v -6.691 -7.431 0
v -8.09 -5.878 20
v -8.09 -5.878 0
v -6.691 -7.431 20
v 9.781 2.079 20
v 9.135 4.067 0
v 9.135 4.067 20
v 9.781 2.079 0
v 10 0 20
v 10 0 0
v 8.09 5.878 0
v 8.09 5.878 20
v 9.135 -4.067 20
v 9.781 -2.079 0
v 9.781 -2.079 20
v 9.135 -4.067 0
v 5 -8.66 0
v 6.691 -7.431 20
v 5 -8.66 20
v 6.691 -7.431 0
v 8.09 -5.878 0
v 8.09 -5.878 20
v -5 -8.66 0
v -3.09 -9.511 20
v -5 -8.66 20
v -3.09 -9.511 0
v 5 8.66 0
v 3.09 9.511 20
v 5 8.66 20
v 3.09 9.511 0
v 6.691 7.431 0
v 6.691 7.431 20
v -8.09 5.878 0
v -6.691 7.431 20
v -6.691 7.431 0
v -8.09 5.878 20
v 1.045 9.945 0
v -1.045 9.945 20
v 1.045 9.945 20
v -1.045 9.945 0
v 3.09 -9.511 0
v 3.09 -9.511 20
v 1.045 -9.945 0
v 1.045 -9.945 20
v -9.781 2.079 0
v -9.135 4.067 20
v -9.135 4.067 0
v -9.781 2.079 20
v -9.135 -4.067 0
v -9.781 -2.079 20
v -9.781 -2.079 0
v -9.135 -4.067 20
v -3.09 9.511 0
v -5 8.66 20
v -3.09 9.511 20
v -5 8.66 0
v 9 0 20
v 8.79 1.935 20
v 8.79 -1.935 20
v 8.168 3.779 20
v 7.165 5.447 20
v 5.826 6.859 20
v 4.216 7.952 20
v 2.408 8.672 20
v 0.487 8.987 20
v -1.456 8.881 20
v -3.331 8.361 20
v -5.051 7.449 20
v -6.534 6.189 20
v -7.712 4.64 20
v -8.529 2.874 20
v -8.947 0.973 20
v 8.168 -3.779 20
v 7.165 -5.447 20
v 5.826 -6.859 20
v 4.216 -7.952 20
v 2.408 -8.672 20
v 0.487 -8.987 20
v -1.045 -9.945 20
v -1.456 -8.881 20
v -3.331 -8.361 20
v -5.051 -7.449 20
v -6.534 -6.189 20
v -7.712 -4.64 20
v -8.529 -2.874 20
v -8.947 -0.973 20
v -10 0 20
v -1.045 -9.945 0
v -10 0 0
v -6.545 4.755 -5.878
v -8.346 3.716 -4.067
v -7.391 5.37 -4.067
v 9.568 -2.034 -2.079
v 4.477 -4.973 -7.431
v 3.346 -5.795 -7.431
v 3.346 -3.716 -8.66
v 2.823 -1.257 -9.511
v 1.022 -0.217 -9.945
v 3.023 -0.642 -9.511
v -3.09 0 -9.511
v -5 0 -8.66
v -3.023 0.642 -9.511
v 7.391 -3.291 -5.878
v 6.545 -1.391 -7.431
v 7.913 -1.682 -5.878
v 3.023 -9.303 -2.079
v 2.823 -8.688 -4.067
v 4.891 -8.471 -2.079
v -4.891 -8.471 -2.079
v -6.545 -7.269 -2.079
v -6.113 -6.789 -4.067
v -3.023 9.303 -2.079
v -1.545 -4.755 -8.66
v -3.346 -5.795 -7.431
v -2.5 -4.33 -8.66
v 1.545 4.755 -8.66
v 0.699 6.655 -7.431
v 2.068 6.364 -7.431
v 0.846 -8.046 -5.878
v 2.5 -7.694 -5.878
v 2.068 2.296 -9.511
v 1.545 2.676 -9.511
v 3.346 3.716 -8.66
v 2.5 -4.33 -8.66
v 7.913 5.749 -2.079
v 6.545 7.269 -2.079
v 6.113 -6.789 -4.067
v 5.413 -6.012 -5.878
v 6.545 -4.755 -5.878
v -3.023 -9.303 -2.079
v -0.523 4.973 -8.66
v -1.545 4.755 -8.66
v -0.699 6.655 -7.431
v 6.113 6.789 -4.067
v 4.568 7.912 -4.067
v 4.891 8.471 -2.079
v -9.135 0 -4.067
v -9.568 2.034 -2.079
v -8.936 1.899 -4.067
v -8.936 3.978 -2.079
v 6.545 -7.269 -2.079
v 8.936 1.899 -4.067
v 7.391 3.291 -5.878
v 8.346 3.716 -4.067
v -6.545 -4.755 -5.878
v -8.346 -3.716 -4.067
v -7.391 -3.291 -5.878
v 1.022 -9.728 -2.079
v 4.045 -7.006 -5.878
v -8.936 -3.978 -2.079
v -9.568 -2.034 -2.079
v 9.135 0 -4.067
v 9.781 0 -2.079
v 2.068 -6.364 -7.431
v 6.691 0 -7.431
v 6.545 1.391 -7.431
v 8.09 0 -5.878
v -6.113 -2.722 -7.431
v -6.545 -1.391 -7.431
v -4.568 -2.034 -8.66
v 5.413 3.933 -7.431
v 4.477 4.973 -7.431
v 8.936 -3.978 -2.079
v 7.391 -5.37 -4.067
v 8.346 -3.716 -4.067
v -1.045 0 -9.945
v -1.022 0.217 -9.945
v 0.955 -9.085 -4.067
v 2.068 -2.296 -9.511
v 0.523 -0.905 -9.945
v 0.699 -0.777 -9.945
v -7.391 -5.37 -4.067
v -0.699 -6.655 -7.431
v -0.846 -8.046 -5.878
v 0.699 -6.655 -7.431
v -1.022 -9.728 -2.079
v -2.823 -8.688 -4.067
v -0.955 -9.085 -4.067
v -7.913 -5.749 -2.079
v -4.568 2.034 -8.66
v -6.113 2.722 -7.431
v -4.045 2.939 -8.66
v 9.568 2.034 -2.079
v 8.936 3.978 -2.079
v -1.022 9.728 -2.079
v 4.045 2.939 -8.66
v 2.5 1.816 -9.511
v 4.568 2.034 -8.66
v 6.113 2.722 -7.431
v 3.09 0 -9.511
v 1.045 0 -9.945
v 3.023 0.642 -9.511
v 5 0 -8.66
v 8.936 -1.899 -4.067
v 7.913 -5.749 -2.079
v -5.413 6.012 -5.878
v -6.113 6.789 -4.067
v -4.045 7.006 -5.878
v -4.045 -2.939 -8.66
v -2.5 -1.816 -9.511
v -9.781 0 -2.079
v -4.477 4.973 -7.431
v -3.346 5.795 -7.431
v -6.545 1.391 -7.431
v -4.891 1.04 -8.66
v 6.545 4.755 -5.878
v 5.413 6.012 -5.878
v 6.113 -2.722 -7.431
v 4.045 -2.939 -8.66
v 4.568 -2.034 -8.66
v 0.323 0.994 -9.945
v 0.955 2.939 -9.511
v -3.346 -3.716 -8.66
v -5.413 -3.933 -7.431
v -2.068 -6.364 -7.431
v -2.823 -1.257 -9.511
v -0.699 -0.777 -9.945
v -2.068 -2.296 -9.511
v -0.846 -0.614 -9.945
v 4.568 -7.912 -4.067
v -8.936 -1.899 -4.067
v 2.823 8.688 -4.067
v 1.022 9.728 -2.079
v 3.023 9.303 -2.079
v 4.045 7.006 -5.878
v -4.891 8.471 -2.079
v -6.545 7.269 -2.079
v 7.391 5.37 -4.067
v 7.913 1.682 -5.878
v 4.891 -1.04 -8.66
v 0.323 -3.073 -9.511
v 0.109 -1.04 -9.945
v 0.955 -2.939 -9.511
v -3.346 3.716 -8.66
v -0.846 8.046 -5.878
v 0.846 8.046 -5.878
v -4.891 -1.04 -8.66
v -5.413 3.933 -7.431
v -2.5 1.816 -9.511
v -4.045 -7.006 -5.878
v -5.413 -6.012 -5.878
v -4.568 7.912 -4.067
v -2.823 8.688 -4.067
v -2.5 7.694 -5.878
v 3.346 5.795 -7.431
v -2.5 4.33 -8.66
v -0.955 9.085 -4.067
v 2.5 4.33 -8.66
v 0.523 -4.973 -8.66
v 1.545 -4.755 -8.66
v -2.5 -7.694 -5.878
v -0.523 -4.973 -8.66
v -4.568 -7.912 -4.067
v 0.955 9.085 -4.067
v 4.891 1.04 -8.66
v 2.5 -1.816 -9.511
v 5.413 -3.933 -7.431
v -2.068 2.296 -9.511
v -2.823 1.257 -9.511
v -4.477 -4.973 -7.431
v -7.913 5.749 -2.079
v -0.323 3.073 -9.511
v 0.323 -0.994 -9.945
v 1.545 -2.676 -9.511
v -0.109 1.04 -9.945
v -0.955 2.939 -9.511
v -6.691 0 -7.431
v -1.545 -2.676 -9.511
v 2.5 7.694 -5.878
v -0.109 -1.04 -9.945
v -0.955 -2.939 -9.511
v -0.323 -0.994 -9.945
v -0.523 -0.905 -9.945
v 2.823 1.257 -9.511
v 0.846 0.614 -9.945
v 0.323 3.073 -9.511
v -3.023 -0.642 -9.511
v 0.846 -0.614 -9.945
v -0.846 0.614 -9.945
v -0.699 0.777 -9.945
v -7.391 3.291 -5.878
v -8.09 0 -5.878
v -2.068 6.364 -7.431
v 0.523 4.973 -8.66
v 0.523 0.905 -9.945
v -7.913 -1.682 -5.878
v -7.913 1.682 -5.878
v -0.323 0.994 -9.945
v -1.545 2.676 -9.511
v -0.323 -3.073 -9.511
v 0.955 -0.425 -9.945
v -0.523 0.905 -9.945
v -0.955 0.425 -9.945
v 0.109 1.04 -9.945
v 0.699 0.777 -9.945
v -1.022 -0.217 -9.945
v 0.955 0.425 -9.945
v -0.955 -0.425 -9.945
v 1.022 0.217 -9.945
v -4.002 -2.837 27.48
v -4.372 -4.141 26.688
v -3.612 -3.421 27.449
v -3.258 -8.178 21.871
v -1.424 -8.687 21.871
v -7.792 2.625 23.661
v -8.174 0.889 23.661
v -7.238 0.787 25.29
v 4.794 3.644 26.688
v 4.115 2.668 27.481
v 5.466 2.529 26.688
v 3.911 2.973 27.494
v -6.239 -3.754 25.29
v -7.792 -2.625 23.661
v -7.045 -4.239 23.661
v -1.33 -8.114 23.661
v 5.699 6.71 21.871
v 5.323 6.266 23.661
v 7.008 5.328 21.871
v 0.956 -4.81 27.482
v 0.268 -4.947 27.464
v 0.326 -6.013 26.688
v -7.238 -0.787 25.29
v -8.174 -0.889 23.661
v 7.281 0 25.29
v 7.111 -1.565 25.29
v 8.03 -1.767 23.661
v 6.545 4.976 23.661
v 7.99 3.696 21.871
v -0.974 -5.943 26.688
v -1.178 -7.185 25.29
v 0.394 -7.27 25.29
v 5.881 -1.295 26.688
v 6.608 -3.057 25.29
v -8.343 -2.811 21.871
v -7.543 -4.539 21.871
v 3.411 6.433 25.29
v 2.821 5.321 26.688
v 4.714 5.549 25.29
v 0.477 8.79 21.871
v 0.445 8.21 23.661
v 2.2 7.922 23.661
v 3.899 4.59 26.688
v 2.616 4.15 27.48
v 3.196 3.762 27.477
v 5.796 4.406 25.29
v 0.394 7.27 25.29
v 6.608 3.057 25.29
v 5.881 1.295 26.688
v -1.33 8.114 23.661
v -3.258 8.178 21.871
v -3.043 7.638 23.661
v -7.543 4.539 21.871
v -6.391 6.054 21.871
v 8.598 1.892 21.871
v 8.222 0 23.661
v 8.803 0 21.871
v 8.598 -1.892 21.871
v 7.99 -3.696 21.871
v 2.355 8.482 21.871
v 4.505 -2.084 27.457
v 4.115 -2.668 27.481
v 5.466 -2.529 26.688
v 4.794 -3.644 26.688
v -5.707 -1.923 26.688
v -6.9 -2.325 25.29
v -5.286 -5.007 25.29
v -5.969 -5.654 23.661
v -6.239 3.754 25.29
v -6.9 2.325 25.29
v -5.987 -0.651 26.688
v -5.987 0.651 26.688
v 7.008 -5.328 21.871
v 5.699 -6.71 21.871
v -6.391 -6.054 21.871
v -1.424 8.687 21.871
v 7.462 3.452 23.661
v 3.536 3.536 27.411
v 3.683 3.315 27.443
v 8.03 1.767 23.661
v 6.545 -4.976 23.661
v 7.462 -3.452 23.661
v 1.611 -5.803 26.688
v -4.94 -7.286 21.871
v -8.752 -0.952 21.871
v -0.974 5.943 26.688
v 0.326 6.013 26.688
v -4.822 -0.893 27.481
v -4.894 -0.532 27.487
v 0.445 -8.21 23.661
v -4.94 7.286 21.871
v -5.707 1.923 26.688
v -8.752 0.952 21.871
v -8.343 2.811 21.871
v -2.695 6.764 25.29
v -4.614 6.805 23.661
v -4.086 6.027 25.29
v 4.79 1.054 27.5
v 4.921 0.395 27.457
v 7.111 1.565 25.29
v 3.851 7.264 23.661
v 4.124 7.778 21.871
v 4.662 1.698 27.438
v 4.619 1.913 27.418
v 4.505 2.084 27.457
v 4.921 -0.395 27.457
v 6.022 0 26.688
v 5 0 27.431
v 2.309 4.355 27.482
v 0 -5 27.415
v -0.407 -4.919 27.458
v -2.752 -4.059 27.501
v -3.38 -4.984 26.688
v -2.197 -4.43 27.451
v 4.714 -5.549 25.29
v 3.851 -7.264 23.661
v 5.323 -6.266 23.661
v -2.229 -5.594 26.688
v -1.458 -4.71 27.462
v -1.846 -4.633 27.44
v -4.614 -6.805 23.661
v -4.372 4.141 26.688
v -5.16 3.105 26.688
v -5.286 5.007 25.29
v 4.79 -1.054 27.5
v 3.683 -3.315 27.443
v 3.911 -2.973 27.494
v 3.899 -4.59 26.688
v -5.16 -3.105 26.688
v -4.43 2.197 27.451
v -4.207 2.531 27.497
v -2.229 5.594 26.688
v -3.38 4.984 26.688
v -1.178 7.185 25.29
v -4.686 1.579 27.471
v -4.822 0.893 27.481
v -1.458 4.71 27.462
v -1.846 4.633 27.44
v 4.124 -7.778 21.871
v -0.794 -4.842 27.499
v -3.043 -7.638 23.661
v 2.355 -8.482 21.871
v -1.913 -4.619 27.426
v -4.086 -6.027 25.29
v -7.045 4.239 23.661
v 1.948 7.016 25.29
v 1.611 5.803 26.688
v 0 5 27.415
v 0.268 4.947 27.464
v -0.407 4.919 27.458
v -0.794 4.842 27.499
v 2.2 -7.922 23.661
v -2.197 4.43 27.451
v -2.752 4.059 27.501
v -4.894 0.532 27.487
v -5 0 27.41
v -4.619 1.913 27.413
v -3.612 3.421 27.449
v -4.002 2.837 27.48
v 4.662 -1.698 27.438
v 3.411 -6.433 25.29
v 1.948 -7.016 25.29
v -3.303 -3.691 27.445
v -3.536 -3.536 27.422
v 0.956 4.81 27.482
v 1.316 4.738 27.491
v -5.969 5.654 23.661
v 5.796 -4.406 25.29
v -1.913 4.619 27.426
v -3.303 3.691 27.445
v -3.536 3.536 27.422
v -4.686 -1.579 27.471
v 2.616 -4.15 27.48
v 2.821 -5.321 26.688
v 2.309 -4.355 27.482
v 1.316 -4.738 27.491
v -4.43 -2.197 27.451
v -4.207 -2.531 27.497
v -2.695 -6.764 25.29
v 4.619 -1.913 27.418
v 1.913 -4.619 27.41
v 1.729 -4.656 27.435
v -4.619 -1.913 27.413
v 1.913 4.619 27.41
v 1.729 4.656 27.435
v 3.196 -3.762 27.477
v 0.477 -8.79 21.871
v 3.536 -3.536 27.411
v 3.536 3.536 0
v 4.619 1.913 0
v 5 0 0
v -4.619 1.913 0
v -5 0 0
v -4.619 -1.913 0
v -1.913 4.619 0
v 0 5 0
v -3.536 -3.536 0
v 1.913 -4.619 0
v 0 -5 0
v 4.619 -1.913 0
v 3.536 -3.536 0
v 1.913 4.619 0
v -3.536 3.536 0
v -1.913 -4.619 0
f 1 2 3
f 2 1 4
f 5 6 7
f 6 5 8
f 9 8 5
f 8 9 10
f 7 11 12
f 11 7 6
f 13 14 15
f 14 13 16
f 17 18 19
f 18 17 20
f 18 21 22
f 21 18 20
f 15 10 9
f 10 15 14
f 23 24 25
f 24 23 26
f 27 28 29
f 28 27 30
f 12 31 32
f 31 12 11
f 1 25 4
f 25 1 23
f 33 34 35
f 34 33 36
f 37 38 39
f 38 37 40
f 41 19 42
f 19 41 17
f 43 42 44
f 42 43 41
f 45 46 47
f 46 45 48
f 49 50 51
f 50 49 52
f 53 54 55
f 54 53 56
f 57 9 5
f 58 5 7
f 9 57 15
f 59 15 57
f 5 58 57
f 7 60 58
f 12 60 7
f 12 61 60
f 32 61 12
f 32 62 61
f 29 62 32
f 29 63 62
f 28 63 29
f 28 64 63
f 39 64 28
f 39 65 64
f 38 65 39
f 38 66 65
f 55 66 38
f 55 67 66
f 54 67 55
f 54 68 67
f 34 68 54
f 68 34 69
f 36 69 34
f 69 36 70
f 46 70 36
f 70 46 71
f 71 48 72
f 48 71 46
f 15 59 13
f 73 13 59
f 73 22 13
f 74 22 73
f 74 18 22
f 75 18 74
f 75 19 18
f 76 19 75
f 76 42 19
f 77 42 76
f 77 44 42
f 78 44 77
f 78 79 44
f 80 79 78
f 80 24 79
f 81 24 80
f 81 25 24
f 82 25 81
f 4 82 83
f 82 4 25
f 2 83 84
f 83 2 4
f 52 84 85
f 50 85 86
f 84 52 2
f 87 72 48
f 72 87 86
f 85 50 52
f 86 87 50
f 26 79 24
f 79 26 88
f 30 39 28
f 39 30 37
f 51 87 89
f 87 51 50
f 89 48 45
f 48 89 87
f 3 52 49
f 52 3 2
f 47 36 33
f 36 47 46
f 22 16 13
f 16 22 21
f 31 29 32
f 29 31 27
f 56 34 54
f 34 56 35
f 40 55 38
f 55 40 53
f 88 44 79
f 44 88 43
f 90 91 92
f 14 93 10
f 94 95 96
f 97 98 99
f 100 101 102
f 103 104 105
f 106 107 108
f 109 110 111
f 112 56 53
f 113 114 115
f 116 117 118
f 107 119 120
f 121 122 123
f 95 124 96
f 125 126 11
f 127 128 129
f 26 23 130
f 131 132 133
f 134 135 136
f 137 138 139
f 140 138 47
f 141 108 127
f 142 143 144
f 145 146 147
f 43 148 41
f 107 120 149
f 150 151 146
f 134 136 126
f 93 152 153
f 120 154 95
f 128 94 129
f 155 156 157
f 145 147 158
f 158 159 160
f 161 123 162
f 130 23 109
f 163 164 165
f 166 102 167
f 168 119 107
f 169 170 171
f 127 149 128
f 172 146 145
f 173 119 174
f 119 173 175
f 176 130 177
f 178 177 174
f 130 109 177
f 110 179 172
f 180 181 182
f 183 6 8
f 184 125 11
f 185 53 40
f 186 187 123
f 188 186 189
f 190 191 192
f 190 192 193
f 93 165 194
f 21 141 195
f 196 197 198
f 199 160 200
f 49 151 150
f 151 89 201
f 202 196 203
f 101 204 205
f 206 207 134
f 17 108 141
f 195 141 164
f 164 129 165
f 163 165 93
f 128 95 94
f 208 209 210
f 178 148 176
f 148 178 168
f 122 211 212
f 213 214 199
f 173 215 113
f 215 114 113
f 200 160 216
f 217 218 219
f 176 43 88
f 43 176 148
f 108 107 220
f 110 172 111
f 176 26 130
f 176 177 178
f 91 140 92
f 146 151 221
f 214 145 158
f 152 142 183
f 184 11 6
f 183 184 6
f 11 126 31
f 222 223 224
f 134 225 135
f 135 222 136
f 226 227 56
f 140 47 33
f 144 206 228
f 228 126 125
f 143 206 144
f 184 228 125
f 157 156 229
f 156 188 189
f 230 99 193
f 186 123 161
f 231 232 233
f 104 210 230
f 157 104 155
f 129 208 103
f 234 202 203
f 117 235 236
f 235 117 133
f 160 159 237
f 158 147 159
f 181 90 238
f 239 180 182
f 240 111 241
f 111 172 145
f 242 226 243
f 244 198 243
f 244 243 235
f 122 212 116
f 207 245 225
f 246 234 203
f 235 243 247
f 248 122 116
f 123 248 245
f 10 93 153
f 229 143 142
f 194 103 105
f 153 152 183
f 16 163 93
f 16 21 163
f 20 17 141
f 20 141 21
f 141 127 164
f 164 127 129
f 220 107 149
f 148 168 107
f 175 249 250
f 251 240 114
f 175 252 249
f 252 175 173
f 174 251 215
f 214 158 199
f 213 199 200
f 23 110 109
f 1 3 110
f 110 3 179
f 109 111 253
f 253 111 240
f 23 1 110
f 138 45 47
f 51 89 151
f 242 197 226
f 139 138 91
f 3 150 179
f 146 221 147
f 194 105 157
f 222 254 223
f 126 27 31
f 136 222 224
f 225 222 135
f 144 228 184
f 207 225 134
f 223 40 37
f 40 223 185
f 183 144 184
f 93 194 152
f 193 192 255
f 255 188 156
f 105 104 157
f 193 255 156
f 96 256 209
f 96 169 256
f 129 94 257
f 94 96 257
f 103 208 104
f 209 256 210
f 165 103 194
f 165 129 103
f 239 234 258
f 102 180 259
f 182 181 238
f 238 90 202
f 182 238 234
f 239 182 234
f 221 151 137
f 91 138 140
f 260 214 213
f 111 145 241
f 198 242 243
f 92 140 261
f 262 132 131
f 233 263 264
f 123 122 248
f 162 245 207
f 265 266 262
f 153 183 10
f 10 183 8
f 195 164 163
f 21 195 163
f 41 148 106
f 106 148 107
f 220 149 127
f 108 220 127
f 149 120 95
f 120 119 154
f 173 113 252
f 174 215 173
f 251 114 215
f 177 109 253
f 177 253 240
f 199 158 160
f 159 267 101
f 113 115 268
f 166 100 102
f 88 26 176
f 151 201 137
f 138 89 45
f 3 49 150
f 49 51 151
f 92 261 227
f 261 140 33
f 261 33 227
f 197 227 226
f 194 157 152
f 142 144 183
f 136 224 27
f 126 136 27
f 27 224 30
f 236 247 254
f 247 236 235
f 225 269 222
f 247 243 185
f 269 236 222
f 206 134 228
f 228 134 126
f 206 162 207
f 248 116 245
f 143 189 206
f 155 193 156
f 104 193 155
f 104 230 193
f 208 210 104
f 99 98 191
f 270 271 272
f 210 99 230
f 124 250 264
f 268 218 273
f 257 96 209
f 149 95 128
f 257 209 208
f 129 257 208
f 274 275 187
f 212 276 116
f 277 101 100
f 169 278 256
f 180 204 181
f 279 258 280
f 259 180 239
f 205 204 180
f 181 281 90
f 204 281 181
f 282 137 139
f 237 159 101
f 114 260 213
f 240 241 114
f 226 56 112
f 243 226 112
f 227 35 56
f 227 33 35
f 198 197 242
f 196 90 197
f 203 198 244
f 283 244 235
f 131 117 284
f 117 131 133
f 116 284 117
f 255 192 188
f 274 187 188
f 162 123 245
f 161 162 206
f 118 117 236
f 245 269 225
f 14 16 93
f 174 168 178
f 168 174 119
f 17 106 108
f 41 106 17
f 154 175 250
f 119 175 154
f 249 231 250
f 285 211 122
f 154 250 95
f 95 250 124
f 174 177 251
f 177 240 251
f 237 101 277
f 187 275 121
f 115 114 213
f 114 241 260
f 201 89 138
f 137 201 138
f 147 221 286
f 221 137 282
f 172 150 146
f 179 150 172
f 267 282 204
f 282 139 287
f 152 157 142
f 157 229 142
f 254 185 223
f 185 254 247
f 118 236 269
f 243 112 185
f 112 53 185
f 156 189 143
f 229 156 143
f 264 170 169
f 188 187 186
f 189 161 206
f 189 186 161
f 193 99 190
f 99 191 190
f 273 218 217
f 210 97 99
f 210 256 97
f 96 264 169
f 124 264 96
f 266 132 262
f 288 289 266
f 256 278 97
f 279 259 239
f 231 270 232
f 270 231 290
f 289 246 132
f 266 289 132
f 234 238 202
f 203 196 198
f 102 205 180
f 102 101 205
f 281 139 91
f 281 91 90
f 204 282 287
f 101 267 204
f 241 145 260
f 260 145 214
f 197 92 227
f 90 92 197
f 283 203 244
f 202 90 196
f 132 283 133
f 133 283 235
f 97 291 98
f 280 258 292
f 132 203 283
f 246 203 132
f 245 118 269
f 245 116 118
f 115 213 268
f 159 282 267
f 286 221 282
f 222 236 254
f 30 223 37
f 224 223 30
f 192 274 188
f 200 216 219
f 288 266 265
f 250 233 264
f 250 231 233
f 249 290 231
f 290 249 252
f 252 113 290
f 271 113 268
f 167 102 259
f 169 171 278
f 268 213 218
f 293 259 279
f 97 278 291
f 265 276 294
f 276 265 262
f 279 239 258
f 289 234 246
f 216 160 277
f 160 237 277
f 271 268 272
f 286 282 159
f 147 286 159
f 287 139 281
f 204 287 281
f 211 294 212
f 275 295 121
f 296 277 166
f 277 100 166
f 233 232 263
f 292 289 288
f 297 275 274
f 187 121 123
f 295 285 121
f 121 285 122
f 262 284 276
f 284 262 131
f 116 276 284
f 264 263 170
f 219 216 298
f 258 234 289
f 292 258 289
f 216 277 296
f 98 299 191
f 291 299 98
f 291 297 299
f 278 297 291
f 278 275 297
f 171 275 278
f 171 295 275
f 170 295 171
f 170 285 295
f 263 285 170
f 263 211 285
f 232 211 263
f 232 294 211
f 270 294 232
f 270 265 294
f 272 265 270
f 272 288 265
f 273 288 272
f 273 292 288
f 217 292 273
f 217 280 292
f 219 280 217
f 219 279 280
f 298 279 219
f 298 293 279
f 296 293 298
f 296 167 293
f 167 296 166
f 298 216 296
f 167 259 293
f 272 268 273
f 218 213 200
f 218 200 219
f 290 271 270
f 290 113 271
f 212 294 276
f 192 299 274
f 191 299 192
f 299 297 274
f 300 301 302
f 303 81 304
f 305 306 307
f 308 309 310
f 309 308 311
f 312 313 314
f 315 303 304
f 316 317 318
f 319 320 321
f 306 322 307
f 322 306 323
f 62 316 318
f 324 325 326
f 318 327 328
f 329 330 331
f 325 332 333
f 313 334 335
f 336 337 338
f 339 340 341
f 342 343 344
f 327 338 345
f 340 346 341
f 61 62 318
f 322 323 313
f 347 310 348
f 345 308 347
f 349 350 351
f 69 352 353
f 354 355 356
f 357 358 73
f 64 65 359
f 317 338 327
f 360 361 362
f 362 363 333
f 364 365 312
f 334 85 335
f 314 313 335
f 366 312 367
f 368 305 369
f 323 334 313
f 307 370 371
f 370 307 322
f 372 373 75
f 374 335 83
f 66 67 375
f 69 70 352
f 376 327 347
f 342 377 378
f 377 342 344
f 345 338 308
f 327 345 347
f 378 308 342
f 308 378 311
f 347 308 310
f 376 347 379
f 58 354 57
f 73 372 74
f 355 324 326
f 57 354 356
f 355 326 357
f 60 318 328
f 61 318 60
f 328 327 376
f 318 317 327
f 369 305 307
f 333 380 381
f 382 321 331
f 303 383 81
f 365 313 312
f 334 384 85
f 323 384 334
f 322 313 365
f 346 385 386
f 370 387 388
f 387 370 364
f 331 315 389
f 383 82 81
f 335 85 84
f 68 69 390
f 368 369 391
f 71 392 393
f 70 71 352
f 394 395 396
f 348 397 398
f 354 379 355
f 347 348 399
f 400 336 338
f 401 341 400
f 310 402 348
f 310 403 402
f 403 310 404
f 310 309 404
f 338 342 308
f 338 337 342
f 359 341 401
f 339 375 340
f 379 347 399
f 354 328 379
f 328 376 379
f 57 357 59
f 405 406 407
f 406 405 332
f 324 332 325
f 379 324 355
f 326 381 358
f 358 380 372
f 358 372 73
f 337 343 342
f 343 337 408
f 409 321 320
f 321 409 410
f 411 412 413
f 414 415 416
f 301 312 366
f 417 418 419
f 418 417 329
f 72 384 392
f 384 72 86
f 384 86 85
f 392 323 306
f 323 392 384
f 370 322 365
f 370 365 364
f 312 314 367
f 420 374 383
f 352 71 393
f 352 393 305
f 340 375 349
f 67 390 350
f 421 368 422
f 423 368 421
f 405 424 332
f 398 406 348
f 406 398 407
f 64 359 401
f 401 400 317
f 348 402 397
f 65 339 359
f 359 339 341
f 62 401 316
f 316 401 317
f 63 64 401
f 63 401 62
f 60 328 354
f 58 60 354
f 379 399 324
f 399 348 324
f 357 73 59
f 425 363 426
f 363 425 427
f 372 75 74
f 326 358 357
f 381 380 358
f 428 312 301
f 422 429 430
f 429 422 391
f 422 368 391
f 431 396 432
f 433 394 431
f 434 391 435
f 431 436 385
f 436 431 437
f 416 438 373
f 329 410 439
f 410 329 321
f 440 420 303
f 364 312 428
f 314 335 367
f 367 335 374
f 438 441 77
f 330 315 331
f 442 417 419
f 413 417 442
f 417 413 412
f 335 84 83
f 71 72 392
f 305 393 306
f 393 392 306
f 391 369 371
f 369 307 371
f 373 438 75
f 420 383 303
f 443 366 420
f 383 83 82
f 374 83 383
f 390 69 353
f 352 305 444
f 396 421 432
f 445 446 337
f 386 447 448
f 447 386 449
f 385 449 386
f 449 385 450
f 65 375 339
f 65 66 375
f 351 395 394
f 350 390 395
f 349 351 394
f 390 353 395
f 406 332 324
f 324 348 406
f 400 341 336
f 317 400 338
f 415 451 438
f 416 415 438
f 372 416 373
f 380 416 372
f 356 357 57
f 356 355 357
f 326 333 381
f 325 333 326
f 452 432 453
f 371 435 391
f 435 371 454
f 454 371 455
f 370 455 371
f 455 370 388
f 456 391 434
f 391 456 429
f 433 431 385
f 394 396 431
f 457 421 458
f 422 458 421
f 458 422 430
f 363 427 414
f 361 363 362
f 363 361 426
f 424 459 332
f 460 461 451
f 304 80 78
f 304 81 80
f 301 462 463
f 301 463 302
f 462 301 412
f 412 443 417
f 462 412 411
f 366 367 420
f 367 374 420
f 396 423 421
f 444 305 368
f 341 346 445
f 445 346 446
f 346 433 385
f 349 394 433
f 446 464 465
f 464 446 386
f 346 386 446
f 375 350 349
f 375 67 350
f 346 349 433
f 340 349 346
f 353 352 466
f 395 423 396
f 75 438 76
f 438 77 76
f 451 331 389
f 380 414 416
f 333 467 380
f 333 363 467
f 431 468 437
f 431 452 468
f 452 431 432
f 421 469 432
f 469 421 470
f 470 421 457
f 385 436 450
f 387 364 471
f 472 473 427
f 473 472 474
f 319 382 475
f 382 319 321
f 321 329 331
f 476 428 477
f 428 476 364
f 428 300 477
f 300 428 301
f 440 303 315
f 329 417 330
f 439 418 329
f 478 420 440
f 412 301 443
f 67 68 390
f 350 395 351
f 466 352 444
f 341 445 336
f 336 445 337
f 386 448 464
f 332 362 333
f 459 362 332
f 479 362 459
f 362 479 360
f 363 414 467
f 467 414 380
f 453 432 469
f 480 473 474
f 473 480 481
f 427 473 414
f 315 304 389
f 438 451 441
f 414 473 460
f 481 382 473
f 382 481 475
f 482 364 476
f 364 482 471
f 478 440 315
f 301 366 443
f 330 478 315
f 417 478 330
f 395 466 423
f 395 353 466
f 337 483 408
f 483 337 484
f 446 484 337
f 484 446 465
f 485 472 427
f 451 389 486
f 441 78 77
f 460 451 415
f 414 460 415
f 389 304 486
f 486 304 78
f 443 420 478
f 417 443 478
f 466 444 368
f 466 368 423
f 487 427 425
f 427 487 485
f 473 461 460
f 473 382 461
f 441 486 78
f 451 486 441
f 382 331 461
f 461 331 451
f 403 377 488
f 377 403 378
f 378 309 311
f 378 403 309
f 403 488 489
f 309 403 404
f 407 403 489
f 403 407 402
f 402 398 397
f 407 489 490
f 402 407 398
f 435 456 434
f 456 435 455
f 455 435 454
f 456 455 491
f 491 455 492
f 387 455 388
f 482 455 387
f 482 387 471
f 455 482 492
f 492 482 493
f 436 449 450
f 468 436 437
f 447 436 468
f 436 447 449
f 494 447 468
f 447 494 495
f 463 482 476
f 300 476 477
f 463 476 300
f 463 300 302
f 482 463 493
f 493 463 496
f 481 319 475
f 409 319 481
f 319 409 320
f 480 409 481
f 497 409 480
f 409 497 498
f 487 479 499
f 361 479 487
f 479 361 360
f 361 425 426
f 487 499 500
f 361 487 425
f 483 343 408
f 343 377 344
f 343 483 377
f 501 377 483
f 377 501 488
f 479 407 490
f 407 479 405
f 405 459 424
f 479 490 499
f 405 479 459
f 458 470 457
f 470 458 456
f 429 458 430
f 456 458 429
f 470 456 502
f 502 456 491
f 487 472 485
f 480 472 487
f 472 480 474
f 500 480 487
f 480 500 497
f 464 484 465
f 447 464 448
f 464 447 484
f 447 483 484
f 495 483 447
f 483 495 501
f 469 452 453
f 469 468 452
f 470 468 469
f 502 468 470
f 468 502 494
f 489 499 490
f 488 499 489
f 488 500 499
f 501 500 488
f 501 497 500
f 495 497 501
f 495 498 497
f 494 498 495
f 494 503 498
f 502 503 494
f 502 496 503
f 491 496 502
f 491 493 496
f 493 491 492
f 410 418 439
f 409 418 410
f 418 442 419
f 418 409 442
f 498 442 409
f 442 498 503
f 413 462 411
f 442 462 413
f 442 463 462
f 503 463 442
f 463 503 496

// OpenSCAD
difference(){
union(){
cylinder(20,10,10);
sphere (10);
sphere(10);
translate ([0,0,20])
sphere(9) ;        
}
/*union(){
#cylinder(10,5,5);
rotate([90,90,90]);
cylinder(10,8,9);
sphere(10);
}*/
union(){
cylinder(40,5,5);
}}
